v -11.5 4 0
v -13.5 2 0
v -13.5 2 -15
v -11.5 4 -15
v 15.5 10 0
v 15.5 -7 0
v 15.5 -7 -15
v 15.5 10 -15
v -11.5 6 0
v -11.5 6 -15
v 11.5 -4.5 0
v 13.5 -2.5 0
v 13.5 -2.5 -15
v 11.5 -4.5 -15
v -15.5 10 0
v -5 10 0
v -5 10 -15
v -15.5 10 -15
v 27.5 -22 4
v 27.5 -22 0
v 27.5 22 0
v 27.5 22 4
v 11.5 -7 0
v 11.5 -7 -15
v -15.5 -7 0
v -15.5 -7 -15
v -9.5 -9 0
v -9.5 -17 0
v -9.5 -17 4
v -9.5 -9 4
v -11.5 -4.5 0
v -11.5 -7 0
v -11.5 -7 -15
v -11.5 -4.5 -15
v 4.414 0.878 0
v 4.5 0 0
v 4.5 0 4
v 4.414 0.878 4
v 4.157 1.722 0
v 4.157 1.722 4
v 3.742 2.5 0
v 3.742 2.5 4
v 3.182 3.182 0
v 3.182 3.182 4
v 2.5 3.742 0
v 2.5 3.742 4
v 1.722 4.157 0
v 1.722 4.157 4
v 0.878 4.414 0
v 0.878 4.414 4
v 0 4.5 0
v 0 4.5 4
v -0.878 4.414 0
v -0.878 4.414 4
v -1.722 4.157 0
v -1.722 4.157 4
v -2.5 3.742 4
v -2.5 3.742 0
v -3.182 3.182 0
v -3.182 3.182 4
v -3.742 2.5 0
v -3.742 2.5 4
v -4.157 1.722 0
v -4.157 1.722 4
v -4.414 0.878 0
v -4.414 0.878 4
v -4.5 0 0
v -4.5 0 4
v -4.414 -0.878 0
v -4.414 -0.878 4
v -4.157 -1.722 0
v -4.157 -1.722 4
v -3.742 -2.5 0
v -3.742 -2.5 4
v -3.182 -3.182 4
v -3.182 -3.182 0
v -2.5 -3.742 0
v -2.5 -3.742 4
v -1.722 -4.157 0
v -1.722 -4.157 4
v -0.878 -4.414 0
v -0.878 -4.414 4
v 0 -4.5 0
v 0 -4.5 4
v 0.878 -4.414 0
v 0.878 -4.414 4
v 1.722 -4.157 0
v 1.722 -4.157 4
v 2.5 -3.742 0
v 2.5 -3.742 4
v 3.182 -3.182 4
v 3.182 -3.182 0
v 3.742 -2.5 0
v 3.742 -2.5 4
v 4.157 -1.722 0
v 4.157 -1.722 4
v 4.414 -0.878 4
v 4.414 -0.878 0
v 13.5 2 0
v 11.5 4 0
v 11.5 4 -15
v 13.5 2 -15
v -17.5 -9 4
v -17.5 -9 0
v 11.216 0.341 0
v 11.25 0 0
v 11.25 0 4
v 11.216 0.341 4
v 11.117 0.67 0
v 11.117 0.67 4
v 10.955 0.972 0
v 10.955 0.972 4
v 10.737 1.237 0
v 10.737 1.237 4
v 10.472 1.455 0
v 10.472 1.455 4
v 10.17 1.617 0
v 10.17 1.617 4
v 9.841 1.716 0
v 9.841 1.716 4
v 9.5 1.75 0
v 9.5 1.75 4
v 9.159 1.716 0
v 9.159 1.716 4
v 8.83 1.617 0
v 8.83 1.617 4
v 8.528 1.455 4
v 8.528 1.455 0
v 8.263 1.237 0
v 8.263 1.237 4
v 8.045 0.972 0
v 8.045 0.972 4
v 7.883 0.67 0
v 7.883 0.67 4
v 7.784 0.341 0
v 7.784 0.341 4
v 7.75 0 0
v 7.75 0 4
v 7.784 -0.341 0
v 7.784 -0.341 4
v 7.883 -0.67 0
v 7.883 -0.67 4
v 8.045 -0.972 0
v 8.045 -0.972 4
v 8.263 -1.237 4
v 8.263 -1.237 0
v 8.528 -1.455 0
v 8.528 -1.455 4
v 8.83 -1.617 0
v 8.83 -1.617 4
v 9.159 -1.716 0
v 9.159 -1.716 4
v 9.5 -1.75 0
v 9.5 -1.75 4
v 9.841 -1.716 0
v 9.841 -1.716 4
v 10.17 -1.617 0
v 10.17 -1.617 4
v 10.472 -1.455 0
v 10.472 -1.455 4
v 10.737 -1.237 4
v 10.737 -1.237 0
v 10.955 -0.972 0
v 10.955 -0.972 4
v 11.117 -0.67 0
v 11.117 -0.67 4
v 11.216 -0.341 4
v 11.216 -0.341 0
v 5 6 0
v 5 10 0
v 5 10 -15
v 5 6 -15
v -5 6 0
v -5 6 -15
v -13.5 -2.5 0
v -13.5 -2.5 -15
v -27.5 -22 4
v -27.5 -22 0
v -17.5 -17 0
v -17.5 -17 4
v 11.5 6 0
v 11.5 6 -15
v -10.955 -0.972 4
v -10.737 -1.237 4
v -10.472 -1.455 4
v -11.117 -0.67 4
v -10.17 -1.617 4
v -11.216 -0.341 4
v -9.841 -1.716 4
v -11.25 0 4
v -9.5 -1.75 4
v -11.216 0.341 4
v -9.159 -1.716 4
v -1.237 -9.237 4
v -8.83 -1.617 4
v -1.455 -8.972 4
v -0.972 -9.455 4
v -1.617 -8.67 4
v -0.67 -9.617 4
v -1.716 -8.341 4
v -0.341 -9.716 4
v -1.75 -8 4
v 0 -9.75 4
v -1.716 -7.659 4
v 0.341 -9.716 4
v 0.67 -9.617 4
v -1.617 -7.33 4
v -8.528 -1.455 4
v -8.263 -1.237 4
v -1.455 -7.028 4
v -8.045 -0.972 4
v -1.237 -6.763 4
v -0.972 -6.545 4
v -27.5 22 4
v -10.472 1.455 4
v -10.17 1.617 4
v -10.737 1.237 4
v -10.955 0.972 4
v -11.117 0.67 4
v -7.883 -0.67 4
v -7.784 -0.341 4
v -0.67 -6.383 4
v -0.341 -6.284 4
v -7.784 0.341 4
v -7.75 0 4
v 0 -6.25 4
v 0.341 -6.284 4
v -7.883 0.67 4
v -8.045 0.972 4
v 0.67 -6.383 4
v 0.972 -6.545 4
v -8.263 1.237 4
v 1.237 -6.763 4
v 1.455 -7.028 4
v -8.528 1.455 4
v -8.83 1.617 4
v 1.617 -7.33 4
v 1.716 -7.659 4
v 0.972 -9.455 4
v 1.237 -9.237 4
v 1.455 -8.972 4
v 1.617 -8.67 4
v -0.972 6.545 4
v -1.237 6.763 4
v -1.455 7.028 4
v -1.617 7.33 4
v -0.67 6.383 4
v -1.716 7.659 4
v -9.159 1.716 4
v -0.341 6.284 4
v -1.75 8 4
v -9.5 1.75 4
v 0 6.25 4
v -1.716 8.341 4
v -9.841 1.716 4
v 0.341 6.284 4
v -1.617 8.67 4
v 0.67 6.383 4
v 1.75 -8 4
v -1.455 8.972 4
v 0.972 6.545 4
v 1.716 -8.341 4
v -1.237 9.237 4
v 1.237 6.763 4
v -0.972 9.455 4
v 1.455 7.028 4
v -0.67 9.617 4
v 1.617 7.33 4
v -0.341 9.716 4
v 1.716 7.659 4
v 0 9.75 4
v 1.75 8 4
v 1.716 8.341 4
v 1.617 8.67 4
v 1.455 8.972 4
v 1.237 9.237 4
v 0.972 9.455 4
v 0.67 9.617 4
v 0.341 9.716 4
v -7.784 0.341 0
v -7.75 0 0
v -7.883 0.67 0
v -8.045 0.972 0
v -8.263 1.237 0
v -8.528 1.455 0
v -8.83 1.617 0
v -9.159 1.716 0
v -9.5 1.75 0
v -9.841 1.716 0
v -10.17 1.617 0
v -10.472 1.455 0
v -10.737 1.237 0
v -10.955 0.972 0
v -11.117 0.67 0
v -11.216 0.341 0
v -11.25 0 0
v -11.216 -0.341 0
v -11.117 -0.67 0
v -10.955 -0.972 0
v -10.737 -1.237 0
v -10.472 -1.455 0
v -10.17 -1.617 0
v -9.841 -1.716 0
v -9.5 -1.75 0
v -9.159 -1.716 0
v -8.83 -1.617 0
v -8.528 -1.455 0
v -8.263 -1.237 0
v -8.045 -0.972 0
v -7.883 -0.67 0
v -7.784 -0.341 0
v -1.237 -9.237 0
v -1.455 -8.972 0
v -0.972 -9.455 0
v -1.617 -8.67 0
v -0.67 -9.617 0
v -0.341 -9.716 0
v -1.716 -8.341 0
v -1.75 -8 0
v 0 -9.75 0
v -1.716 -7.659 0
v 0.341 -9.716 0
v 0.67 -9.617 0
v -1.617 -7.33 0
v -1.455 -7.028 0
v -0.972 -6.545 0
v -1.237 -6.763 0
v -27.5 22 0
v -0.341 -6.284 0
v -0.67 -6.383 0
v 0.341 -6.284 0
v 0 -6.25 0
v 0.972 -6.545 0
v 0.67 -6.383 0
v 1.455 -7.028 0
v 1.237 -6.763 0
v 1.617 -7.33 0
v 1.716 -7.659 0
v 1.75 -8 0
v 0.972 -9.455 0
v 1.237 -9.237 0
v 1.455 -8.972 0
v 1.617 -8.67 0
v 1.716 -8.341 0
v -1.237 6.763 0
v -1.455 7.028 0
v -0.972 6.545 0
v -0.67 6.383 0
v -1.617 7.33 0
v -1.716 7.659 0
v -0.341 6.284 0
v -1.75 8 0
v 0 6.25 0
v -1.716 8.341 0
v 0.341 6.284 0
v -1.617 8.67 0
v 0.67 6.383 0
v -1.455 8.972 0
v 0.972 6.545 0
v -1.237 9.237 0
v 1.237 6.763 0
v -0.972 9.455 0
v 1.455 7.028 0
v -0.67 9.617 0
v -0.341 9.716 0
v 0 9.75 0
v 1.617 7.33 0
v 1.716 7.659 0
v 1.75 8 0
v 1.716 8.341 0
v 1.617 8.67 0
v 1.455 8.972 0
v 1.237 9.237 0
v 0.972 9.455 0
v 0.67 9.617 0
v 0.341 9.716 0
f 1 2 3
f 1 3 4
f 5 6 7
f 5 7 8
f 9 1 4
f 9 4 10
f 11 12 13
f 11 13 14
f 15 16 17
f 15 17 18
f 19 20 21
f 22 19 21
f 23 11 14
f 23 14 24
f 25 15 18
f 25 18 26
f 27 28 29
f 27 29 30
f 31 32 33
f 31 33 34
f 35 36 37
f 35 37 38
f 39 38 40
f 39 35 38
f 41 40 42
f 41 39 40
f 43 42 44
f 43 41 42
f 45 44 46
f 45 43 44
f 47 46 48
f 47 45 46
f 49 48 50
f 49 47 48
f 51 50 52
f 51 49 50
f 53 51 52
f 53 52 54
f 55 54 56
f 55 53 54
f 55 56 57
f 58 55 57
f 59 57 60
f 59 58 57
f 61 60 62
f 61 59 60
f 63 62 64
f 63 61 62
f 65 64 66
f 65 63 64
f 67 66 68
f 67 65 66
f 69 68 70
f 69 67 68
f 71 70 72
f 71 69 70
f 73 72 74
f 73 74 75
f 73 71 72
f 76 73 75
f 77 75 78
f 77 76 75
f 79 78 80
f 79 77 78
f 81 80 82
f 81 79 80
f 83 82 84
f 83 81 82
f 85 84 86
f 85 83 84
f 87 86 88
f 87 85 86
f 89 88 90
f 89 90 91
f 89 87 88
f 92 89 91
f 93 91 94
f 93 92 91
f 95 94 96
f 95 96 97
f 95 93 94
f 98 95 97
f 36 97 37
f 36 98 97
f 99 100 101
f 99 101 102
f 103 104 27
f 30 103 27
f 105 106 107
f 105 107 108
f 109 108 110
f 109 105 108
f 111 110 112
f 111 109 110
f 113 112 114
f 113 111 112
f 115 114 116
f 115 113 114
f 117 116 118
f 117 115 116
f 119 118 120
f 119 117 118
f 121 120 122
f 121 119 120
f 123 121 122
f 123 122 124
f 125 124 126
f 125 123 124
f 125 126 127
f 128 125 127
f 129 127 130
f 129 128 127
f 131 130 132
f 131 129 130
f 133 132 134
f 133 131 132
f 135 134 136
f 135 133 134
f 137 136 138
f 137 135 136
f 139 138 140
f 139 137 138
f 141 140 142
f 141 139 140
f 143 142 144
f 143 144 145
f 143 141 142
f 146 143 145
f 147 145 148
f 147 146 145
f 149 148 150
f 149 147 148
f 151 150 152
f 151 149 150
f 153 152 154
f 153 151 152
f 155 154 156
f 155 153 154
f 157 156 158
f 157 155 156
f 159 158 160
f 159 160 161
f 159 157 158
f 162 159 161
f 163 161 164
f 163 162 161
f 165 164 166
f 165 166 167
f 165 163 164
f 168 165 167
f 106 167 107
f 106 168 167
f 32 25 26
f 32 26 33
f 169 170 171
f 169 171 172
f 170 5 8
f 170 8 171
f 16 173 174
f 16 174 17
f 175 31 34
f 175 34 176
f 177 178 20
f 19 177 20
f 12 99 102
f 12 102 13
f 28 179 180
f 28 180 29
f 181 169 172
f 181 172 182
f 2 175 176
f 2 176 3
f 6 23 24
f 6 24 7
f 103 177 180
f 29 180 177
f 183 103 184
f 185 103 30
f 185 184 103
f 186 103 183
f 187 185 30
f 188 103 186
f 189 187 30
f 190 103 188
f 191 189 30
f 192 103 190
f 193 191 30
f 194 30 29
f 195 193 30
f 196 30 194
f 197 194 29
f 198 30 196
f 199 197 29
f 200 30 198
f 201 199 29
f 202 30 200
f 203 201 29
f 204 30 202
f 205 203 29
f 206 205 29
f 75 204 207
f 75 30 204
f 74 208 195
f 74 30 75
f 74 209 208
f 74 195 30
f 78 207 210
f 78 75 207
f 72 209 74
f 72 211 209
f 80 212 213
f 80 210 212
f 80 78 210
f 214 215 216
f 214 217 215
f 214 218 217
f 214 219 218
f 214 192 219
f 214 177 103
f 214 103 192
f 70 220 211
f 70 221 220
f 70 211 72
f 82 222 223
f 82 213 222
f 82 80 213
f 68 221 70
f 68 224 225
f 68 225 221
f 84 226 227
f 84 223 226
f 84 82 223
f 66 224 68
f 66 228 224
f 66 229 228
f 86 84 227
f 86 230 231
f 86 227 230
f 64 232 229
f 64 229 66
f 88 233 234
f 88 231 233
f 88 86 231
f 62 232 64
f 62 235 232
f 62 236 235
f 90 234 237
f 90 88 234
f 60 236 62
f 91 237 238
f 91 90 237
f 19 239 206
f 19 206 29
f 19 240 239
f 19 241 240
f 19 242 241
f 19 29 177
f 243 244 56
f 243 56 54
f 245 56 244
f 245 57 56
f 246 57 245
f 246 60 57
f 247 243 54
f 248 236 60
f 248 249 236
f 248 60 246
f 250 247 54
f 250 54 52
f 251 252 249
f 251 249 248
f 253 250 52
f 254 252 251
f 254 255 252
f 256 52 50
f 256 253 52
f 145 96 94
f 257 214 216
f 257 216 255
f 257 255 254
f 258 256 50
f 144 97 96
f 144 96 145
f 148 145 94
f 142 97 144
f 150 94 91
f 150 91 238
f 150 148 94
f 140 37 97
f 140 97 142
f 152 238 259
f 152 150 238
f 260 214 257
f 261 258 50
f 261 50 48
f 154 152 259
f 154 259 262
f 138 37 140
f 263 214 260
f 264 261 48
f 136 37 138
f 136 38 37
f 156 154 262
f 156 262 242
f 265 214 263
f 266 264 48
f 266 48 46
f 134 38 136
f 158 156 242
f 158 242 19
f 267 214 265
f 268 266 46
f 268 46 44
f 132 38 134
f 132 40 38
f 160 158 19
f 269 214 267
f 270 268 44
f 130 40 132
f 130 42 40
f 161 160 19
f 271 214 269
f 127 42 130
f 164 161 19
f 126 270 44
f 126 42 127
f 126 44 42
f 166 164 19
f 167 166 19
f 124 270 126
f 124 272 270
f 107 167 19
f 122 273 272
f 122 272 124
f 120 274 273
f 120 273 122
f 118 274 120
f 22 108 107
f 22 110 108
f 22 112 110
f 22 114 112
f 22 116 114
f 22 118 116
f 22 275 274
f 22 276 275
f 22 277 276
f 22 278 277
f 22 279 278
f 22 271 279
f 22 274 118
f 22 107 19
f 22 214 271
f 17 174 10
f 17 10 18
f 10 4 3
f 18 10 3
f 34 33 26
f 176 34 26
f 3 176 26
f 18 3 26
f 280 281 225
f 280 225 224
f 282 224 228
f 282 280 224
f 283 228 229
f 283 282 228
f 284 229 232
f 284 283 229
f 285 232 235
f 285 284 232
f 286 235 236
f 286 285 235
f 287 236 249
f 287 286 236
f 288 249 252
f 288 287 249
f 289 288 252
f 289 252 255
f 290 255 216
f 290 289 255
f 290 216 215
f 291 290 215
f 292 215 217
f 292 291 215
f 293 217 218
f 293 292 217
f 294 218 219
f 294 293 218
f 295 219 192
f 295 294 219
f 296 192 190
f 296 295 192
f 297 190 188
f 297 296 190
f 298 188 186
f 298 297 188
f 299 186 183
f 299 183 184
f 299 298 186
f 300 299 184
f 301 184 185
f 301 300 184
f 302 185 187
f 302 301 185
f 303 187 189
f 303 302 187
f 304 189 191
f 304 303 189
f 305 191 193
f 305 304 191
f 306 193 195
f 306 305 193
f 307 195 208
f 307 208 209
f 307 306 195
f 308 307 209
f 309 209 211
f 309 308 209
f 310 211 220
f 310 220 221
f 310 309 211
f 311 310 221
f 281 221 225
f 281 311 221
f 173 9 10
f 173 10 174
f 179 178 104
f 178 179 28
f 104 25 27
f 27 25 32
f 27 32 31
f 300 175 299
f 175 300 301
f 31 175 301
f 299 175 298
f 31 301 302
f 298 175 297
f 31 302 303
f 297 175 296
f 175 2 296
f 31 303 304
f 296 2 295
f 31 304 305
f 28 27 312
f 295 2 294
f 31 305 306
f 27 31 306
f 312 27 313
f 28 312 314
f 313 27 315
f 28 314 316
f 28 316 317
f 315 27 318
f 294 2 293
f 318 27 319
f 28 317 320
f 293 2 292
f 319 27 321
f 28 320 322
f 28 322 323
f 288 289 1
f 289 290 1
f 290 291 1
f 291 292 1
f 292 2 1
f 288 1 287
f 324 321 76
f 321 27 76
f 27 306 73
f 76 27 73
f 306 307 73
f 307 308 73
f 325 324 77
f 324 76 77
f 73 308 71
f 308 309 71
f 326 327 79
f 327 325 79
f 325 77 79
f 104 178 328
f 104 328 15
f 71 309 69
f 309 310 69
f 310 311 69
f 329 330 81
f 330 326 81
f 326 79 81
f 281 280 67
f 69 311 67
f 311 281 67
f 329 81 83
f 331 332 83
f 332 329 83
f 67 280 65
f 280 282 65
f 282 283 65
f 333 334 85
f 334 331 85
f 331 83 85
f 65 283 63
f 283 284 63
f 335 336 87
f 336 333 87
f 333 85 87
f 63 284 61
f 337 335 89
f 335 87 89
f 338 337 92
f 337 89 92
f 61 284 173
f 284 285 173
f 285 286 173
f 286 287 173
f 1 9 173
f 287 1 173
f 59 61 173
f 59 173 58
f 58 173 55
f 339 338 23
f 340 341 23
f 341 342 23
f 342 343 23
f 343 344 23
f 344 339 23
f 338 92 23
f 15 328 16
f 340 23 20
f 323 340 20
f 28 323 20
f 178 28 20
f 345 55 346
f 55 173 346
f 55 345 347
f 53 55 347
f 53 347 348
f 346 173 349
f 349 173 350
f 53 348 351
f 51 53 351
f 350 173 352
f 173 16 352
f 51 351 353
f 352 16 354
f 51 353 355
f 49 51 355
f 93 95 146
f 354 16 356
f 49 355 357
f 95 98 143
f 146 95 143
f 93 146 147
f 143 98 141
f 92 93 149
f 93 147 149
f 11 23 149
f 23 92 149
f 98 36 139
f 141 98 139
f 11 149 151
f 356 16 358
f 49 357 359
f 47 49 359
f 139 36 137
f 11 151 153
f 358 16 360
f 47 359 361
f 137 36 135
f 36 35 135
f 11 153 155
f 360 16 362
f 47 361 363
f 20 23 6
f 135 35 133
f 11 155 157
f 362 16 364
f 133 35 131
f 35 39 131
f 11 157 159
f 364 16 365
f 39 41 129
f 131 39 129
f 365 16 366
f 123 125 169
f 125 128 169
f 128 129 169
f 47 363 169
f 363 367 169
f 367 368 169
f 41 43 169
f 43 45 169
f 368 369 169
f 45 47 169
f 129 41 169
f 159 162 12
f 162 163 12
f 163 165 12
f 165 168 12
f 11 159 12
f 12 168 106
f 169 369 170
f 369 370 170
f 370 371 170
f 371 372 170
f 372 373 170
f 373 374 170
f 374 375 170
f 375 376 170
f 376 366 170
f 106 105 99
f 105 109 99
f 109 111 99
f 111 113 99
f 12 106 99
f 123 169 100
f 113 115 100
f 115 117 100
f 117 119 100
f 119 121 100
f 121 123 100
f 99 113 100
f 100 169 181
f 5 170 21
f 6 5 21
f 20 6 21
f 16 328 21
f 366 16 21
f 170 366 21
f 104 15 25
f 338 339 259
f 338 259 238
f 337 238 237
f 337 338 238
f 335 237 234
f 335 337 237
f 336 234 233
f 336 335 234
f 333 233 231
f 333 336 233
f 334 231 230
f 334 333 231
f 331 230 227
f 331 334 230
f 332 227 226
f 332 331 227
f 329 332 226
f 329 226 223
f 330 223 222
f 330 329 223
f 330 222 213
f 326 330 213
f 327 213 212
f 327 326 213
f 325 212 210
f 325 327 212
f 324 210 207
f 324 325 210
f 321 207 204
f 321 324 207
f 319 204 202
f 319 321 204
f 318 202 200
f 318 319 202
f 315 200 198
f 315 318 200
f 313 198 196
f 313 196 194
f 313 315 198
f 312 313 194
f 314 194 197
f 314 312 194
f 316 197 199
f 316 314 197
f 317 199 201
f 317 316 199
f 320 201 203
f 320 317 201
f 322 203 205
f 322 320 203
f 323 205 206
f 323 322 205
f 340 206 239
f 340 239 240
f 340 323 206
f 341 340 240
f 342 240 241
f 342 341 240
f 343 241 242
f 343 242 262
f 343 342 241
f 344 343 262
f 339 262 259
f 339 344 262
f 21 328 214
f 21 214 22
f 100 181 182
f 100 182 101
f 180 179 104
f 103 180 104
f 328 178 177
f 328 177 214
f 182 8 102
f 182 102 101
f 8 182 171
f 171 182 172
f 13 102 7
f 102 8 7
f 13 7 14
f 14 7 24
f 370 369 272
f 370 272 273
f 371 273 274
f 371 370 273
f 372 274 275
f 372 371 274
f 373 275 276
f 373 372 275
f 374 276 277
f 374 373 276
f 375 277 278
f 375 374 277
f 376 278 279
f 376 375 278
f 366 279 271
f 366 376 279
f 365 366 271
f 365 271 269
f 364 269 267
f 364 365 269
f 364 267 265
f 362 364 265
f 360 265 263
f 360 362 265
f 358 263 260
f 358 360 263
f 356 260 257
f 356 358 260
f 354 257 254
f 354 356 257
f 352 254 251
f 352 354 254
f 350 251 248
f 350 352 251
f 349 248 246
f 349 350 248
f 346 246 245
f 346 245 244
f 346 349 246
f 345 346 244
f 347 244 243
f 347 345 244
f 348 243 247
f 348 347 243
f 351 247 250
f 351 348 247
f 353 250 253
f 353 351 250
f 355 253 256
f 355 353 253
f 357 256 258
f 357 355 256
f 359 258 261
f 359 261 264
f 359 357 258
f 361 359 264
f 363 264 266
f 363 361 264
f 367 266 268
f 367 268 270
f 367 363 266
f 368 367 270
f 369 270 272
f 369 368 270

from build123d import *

# Parameters (mm, degrees)
SKETCH_W     = 55
SKETCH_H     = 44
SKETCH_R     = 1.75
SKETCH_R_2   = 4.5
SKETCH_W_2   = 8
SKETCH_H_2   = 8
PAD_DEPTH    = 4
PAD001_DEPTH = 15


with BuildPart() as part:
    # Sketch → Pad (new body)
    with BuildSketch(Plane.XY):
        Rectangle(SKETCH_W, SKETCH_H)
        with Locations((-9.5, 0)):
            Circle(SKETCH_R, mode=Mode.SUBTRACT)
        with Locations((0, 8)):
            Circle(SKETCH_R, mode=Mode.SUBTRACT)
        with Locations((9.5, 0)):
            Circle(SKETCH_R, mode=Mode.SUBTRACT)
        with Locations((0, -8)):
            Circle(SKETCH_R, mode=Mode.SUBTRACT)
        Circle(SKETCH_R_2, mode=Mode.SUBTRACT)
        with Locations((-13.5, -13)):
            Rectangle(SKETCH_W_2, SKETCH_H_2, mode=Mode.SUBTRACT)
    extrude(amount=PAD_DEPTH)

    # Sketch001 (on Face14 of Pad) → Pad001 (join)
    with BuildSketch(Plane(origin=(0, 0, 0), x_dir=(1, 0, 0), z_dir=(0, 0, -1))):
        Polygon((-15.5, 7), (-11.5, 7), (-11.5, 4.5), (-13.5, 2.5), (-13.5, -2), (-11.5, -4), (-11.5, -6), (-5, -6), (-5, -10), (-15.5, -10), align=None)
        Polygon((11.5, 7), (15.5, 7), (15.5, -10), (5, -10), (5, -6), (11.5, -6), (11.5, -4), (13.5, -2), (13.5, 2.5), (11.5, 4.5), align=None)
    extrude(amount=PAD001_DEPTH)


solid = part.part
